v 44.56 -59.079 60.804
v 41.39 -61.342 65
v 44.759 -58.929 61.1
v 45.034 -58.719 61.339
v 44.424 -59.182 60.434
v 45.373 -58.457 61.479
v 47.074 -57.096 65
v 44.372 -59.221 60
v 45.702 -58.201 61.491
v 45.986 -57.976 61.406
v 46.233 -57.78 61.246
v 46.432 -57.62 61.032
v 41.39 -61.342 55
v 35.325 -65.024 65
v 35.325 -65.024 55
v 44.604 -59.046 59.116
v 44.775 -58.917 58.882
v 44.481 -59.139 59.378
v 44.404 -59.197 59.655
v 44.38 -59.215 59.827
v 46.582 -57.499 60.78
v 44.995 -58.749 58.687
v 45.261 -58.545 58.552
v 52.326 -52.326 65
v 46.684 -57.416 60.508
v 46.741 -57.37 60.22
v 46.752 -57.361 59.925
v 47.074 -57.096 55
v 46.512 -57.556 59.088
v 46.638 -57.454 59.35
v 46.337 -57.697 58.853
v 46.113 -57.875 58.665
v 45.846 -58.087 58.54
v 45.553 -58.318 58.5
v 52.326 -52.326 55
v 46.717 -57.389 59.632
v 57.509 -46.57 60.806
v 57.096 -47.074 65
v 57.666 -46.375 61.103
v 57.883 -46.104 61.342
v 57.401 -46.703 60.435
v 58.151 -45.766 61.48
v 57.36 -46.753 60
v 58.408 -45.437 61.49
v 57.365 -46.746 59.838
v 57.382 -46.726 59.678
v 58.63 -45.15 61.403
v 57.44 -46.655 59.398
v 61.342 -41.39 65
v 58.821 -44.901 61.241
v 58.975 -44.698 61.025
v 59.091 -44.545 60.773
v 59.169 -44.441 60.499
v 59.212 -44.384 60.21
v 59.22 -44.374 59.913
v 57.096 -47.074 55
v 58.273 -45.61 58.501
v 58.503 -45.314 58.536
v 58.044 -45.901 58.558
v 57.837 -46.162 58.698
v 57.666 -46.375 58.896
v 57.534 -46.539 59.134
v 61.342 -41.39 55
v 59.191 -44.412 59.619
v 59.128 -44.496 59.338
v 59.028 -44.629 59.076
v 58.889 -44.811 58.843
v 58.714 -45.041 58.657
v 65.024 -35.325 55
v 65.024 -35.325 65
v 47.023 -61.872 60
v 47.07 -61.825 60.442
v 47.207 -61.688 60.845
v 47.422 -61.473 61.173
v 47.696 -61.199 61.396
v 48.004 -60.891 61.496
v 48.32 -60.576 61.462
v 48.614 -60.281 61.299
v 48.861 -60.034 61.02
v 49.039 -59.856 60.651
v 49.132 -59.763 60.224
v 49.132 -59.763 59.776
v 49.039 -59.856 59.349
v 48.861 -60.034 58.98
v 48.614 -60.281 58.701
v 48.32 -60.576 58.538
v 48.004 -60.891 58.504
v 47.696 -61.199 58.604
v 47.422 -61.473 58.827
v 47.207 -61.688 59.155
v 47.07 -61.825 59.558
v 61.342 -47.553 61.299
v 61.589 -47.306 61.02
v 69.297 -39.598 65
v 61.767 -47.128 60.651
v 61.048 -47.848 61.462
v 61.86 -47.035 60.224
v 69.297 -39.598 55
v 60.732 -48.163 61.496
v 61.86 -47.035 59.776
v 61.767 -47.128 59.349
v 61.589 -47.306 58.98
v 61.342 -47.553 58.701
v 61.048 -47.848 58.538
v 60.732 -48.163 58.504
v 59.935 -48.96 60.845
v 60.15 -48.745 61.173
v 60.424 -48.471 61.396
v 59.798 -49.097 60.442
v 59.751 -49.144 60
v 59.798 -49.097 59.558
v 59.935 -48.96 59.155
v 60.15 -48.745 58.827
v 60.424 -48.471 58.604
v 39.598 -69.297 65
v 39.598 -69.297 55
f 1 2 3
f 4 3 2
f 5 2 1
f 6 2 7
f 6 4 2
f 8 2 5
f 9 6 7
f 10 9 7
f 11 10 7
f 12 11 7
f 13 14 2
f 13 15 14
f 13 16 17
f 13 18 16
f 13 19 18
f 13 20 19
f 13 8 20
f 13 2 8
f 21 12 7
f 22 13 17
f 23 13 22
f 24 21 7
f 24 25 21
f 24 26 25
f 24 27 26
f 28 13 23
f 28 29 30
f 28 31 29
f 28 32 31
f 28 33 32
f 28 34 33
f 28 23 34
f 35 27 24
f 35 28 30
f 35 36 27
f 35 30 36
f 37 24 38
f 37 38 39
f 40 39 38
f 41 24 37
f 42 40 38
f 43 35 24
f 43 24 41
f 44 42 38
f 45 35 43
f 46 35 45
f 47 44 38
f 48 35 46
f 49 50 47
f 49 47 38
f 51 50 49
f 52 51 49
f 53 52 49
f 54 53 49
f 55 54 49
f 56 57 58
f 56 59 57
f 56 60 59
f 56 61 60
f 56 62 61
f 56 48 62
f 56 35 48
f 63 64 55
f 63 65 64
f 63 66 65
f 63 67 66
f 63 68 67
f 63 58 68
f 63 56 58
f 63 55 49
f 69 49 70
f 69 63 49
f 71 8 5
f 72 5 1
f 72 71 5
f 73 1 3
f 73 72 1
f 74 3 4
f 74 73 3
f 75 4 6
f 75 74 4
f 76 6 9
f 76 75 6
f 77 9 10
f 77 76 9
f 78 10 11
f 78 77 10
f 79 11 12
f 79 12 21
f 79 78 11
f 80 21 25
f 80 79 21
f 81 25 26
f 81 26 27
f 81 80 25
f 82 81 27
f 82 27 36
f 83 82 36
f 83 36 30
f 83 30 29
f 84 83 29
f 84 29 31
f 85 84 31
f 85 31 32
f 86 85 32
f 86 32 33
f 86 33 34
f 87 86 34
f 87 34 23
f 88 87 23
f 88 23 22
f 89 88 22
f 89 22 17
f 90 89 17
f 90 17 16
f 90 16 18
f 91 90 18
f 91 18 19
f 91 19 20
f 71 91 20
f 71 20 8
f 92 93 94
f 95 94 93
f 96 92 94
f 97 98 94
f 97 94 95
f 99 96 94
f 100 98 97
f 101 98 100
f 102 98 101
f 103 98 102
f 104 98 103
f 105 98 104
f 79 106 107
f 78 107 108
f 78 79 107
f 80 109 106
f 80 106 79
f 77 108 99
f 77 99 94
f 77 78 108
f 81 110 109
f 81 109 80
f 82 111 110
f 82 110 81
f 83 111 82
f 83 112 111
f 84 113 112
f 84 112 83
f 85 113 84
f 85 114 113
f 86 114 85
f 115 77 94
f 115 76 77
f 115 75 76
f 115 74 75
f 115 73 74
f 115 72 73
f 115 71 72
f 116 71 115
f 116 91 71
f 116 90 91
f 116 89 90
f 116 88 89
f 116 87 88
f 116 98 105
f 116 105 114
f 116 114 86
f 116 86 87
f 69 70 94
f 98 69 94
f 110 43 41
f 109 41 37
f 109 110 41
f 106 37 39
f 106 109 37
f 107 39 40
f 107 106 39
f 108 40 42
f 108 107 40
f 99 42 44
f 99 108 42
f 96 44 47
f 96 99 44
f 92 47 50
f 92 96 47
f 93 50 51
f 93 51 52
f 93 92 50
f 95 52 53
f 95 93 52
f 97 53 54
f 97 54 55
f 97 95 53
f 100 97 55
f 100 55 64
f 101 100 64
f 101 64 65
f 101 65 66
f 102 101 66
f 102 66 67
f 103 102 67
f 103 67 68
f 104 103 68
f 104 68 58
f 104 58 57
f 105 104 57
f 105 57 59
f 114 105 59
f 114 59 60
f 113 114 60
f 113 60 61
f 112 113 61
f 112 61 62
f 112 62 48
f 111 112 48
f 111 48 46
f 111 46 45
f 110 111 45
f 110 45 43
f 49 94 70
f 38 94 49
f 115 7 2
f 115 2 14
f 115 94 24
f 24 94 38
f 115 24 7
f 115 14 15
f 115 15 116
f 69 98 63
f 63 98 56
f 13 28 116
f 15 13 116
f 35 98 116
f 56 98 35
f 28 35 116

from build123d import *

# Parameters (mm, degrees)
CYLINDER1996_R               = 1.5
CYLINDER1996_DEPTH           = 50
COMPOUND1077_PLACEMENT_ANGLE = 225
CYLINDER1997_R               = 1.5
CYLINDER1997_DEPTH           = 50
COMPOUND1078_PLACEMENT_ANGLE = 225
CYLINDER1995_R               = 74
CYLINDER1995_DEPTH           = 40
BOX987_W                     = 42
BOX987_H                     = 10
BOX987_DEPTH                 = 10
COMPOUND1076_PLACEMENT_ANGLE = 225


with BuildPart() as compound1077:
    # Cylinder1996 → Cylinder1996 (new body)
    with BuildSketch(Plane(origin=(9, 100, 59), x_dir=(1, 0, 0), z_dir=(0, -1, 0))):
        Circle(CYLINDER1996_R)
    extrude(amount=CYLINDER1996_DEPTH)


with BuildPart() as compound1077_1:
    # Compound1077 placement: moved
    add(compound1077.part.rotate(Axis((0, 0, 0), (0, 0, 1)), COMPOUND1077_PLACEMENT_ANGLE))


with BuildPart() as compound1079:
    # Cylinder1997 → Cylinder1997 (new body)
    with BuildSketch(Plane(origin=(-9, 100, 59), x_dir=(1, 0, 0), z_dir=(0, -1, 0))):
        Circle(CYLINDER1997_R)
    extrude(amount=CYLINDER1997_DEPTH)


with BuildPart() as compound1079_1:
    # Compound1078 placement: moved
    add(compound1079.part.rotate(Axis((0, 0, 0), (0, 0, 1)), COMPOUND1078_PLACEMENT_ANGLE))

    # Compound1079: union Compound1077
    add(compound1077_1.part)


with BuildPart() as compound1079_2:
    # Compound1079 placement: moved
    add(compound1079_1.part.moved(Location((0, 0, 1))))


with BuildPart() as v_lec1995:
    # Cylinder1995 → Cylinder1995 (new body)
    with BuildSketch(Plane.XY.offset(44)):
        Circle(CYLINDER1995_R)
    extrude(amount=CYLINDER1995_DEPTH)


with BuildPart() as cut673:
    # Box987 → Box987 (new body)
    with BuildSketch(Plane(origin=(-21, -23, 22), x_dir=(1, 0, 0), z_dir=(0, 0, 1))):
        with Locations((21, 5)):
            Rectangle(BOX987_W, BOX987_H)
    extrude(amount=BOX987_DEPTH)


with BuildPart() as cut673_1:
    # Compound1076 placement: moved
    add(cut673.part.moved(Location((63.64, -63.64, 43))).rotate(Axis((63.64, -63.64, 43), (0, 0, 1)), COMPOUND1076_PLACEMENT_ANGLE))

    # Cut672: cut Válec1995
    add(v_lec1995.part, mode=Mode.SUBTRACT)


with BuildPart() as cut673_2:
    # Cut672 placement: moved
    add(cut673_1.part.moved(Location((0, 0, -10))))

    # Cut673: cut Compound1079
    add(compound1079_2.part, mode=Mode.SUBTRACT)


solid = cut673_2.part
